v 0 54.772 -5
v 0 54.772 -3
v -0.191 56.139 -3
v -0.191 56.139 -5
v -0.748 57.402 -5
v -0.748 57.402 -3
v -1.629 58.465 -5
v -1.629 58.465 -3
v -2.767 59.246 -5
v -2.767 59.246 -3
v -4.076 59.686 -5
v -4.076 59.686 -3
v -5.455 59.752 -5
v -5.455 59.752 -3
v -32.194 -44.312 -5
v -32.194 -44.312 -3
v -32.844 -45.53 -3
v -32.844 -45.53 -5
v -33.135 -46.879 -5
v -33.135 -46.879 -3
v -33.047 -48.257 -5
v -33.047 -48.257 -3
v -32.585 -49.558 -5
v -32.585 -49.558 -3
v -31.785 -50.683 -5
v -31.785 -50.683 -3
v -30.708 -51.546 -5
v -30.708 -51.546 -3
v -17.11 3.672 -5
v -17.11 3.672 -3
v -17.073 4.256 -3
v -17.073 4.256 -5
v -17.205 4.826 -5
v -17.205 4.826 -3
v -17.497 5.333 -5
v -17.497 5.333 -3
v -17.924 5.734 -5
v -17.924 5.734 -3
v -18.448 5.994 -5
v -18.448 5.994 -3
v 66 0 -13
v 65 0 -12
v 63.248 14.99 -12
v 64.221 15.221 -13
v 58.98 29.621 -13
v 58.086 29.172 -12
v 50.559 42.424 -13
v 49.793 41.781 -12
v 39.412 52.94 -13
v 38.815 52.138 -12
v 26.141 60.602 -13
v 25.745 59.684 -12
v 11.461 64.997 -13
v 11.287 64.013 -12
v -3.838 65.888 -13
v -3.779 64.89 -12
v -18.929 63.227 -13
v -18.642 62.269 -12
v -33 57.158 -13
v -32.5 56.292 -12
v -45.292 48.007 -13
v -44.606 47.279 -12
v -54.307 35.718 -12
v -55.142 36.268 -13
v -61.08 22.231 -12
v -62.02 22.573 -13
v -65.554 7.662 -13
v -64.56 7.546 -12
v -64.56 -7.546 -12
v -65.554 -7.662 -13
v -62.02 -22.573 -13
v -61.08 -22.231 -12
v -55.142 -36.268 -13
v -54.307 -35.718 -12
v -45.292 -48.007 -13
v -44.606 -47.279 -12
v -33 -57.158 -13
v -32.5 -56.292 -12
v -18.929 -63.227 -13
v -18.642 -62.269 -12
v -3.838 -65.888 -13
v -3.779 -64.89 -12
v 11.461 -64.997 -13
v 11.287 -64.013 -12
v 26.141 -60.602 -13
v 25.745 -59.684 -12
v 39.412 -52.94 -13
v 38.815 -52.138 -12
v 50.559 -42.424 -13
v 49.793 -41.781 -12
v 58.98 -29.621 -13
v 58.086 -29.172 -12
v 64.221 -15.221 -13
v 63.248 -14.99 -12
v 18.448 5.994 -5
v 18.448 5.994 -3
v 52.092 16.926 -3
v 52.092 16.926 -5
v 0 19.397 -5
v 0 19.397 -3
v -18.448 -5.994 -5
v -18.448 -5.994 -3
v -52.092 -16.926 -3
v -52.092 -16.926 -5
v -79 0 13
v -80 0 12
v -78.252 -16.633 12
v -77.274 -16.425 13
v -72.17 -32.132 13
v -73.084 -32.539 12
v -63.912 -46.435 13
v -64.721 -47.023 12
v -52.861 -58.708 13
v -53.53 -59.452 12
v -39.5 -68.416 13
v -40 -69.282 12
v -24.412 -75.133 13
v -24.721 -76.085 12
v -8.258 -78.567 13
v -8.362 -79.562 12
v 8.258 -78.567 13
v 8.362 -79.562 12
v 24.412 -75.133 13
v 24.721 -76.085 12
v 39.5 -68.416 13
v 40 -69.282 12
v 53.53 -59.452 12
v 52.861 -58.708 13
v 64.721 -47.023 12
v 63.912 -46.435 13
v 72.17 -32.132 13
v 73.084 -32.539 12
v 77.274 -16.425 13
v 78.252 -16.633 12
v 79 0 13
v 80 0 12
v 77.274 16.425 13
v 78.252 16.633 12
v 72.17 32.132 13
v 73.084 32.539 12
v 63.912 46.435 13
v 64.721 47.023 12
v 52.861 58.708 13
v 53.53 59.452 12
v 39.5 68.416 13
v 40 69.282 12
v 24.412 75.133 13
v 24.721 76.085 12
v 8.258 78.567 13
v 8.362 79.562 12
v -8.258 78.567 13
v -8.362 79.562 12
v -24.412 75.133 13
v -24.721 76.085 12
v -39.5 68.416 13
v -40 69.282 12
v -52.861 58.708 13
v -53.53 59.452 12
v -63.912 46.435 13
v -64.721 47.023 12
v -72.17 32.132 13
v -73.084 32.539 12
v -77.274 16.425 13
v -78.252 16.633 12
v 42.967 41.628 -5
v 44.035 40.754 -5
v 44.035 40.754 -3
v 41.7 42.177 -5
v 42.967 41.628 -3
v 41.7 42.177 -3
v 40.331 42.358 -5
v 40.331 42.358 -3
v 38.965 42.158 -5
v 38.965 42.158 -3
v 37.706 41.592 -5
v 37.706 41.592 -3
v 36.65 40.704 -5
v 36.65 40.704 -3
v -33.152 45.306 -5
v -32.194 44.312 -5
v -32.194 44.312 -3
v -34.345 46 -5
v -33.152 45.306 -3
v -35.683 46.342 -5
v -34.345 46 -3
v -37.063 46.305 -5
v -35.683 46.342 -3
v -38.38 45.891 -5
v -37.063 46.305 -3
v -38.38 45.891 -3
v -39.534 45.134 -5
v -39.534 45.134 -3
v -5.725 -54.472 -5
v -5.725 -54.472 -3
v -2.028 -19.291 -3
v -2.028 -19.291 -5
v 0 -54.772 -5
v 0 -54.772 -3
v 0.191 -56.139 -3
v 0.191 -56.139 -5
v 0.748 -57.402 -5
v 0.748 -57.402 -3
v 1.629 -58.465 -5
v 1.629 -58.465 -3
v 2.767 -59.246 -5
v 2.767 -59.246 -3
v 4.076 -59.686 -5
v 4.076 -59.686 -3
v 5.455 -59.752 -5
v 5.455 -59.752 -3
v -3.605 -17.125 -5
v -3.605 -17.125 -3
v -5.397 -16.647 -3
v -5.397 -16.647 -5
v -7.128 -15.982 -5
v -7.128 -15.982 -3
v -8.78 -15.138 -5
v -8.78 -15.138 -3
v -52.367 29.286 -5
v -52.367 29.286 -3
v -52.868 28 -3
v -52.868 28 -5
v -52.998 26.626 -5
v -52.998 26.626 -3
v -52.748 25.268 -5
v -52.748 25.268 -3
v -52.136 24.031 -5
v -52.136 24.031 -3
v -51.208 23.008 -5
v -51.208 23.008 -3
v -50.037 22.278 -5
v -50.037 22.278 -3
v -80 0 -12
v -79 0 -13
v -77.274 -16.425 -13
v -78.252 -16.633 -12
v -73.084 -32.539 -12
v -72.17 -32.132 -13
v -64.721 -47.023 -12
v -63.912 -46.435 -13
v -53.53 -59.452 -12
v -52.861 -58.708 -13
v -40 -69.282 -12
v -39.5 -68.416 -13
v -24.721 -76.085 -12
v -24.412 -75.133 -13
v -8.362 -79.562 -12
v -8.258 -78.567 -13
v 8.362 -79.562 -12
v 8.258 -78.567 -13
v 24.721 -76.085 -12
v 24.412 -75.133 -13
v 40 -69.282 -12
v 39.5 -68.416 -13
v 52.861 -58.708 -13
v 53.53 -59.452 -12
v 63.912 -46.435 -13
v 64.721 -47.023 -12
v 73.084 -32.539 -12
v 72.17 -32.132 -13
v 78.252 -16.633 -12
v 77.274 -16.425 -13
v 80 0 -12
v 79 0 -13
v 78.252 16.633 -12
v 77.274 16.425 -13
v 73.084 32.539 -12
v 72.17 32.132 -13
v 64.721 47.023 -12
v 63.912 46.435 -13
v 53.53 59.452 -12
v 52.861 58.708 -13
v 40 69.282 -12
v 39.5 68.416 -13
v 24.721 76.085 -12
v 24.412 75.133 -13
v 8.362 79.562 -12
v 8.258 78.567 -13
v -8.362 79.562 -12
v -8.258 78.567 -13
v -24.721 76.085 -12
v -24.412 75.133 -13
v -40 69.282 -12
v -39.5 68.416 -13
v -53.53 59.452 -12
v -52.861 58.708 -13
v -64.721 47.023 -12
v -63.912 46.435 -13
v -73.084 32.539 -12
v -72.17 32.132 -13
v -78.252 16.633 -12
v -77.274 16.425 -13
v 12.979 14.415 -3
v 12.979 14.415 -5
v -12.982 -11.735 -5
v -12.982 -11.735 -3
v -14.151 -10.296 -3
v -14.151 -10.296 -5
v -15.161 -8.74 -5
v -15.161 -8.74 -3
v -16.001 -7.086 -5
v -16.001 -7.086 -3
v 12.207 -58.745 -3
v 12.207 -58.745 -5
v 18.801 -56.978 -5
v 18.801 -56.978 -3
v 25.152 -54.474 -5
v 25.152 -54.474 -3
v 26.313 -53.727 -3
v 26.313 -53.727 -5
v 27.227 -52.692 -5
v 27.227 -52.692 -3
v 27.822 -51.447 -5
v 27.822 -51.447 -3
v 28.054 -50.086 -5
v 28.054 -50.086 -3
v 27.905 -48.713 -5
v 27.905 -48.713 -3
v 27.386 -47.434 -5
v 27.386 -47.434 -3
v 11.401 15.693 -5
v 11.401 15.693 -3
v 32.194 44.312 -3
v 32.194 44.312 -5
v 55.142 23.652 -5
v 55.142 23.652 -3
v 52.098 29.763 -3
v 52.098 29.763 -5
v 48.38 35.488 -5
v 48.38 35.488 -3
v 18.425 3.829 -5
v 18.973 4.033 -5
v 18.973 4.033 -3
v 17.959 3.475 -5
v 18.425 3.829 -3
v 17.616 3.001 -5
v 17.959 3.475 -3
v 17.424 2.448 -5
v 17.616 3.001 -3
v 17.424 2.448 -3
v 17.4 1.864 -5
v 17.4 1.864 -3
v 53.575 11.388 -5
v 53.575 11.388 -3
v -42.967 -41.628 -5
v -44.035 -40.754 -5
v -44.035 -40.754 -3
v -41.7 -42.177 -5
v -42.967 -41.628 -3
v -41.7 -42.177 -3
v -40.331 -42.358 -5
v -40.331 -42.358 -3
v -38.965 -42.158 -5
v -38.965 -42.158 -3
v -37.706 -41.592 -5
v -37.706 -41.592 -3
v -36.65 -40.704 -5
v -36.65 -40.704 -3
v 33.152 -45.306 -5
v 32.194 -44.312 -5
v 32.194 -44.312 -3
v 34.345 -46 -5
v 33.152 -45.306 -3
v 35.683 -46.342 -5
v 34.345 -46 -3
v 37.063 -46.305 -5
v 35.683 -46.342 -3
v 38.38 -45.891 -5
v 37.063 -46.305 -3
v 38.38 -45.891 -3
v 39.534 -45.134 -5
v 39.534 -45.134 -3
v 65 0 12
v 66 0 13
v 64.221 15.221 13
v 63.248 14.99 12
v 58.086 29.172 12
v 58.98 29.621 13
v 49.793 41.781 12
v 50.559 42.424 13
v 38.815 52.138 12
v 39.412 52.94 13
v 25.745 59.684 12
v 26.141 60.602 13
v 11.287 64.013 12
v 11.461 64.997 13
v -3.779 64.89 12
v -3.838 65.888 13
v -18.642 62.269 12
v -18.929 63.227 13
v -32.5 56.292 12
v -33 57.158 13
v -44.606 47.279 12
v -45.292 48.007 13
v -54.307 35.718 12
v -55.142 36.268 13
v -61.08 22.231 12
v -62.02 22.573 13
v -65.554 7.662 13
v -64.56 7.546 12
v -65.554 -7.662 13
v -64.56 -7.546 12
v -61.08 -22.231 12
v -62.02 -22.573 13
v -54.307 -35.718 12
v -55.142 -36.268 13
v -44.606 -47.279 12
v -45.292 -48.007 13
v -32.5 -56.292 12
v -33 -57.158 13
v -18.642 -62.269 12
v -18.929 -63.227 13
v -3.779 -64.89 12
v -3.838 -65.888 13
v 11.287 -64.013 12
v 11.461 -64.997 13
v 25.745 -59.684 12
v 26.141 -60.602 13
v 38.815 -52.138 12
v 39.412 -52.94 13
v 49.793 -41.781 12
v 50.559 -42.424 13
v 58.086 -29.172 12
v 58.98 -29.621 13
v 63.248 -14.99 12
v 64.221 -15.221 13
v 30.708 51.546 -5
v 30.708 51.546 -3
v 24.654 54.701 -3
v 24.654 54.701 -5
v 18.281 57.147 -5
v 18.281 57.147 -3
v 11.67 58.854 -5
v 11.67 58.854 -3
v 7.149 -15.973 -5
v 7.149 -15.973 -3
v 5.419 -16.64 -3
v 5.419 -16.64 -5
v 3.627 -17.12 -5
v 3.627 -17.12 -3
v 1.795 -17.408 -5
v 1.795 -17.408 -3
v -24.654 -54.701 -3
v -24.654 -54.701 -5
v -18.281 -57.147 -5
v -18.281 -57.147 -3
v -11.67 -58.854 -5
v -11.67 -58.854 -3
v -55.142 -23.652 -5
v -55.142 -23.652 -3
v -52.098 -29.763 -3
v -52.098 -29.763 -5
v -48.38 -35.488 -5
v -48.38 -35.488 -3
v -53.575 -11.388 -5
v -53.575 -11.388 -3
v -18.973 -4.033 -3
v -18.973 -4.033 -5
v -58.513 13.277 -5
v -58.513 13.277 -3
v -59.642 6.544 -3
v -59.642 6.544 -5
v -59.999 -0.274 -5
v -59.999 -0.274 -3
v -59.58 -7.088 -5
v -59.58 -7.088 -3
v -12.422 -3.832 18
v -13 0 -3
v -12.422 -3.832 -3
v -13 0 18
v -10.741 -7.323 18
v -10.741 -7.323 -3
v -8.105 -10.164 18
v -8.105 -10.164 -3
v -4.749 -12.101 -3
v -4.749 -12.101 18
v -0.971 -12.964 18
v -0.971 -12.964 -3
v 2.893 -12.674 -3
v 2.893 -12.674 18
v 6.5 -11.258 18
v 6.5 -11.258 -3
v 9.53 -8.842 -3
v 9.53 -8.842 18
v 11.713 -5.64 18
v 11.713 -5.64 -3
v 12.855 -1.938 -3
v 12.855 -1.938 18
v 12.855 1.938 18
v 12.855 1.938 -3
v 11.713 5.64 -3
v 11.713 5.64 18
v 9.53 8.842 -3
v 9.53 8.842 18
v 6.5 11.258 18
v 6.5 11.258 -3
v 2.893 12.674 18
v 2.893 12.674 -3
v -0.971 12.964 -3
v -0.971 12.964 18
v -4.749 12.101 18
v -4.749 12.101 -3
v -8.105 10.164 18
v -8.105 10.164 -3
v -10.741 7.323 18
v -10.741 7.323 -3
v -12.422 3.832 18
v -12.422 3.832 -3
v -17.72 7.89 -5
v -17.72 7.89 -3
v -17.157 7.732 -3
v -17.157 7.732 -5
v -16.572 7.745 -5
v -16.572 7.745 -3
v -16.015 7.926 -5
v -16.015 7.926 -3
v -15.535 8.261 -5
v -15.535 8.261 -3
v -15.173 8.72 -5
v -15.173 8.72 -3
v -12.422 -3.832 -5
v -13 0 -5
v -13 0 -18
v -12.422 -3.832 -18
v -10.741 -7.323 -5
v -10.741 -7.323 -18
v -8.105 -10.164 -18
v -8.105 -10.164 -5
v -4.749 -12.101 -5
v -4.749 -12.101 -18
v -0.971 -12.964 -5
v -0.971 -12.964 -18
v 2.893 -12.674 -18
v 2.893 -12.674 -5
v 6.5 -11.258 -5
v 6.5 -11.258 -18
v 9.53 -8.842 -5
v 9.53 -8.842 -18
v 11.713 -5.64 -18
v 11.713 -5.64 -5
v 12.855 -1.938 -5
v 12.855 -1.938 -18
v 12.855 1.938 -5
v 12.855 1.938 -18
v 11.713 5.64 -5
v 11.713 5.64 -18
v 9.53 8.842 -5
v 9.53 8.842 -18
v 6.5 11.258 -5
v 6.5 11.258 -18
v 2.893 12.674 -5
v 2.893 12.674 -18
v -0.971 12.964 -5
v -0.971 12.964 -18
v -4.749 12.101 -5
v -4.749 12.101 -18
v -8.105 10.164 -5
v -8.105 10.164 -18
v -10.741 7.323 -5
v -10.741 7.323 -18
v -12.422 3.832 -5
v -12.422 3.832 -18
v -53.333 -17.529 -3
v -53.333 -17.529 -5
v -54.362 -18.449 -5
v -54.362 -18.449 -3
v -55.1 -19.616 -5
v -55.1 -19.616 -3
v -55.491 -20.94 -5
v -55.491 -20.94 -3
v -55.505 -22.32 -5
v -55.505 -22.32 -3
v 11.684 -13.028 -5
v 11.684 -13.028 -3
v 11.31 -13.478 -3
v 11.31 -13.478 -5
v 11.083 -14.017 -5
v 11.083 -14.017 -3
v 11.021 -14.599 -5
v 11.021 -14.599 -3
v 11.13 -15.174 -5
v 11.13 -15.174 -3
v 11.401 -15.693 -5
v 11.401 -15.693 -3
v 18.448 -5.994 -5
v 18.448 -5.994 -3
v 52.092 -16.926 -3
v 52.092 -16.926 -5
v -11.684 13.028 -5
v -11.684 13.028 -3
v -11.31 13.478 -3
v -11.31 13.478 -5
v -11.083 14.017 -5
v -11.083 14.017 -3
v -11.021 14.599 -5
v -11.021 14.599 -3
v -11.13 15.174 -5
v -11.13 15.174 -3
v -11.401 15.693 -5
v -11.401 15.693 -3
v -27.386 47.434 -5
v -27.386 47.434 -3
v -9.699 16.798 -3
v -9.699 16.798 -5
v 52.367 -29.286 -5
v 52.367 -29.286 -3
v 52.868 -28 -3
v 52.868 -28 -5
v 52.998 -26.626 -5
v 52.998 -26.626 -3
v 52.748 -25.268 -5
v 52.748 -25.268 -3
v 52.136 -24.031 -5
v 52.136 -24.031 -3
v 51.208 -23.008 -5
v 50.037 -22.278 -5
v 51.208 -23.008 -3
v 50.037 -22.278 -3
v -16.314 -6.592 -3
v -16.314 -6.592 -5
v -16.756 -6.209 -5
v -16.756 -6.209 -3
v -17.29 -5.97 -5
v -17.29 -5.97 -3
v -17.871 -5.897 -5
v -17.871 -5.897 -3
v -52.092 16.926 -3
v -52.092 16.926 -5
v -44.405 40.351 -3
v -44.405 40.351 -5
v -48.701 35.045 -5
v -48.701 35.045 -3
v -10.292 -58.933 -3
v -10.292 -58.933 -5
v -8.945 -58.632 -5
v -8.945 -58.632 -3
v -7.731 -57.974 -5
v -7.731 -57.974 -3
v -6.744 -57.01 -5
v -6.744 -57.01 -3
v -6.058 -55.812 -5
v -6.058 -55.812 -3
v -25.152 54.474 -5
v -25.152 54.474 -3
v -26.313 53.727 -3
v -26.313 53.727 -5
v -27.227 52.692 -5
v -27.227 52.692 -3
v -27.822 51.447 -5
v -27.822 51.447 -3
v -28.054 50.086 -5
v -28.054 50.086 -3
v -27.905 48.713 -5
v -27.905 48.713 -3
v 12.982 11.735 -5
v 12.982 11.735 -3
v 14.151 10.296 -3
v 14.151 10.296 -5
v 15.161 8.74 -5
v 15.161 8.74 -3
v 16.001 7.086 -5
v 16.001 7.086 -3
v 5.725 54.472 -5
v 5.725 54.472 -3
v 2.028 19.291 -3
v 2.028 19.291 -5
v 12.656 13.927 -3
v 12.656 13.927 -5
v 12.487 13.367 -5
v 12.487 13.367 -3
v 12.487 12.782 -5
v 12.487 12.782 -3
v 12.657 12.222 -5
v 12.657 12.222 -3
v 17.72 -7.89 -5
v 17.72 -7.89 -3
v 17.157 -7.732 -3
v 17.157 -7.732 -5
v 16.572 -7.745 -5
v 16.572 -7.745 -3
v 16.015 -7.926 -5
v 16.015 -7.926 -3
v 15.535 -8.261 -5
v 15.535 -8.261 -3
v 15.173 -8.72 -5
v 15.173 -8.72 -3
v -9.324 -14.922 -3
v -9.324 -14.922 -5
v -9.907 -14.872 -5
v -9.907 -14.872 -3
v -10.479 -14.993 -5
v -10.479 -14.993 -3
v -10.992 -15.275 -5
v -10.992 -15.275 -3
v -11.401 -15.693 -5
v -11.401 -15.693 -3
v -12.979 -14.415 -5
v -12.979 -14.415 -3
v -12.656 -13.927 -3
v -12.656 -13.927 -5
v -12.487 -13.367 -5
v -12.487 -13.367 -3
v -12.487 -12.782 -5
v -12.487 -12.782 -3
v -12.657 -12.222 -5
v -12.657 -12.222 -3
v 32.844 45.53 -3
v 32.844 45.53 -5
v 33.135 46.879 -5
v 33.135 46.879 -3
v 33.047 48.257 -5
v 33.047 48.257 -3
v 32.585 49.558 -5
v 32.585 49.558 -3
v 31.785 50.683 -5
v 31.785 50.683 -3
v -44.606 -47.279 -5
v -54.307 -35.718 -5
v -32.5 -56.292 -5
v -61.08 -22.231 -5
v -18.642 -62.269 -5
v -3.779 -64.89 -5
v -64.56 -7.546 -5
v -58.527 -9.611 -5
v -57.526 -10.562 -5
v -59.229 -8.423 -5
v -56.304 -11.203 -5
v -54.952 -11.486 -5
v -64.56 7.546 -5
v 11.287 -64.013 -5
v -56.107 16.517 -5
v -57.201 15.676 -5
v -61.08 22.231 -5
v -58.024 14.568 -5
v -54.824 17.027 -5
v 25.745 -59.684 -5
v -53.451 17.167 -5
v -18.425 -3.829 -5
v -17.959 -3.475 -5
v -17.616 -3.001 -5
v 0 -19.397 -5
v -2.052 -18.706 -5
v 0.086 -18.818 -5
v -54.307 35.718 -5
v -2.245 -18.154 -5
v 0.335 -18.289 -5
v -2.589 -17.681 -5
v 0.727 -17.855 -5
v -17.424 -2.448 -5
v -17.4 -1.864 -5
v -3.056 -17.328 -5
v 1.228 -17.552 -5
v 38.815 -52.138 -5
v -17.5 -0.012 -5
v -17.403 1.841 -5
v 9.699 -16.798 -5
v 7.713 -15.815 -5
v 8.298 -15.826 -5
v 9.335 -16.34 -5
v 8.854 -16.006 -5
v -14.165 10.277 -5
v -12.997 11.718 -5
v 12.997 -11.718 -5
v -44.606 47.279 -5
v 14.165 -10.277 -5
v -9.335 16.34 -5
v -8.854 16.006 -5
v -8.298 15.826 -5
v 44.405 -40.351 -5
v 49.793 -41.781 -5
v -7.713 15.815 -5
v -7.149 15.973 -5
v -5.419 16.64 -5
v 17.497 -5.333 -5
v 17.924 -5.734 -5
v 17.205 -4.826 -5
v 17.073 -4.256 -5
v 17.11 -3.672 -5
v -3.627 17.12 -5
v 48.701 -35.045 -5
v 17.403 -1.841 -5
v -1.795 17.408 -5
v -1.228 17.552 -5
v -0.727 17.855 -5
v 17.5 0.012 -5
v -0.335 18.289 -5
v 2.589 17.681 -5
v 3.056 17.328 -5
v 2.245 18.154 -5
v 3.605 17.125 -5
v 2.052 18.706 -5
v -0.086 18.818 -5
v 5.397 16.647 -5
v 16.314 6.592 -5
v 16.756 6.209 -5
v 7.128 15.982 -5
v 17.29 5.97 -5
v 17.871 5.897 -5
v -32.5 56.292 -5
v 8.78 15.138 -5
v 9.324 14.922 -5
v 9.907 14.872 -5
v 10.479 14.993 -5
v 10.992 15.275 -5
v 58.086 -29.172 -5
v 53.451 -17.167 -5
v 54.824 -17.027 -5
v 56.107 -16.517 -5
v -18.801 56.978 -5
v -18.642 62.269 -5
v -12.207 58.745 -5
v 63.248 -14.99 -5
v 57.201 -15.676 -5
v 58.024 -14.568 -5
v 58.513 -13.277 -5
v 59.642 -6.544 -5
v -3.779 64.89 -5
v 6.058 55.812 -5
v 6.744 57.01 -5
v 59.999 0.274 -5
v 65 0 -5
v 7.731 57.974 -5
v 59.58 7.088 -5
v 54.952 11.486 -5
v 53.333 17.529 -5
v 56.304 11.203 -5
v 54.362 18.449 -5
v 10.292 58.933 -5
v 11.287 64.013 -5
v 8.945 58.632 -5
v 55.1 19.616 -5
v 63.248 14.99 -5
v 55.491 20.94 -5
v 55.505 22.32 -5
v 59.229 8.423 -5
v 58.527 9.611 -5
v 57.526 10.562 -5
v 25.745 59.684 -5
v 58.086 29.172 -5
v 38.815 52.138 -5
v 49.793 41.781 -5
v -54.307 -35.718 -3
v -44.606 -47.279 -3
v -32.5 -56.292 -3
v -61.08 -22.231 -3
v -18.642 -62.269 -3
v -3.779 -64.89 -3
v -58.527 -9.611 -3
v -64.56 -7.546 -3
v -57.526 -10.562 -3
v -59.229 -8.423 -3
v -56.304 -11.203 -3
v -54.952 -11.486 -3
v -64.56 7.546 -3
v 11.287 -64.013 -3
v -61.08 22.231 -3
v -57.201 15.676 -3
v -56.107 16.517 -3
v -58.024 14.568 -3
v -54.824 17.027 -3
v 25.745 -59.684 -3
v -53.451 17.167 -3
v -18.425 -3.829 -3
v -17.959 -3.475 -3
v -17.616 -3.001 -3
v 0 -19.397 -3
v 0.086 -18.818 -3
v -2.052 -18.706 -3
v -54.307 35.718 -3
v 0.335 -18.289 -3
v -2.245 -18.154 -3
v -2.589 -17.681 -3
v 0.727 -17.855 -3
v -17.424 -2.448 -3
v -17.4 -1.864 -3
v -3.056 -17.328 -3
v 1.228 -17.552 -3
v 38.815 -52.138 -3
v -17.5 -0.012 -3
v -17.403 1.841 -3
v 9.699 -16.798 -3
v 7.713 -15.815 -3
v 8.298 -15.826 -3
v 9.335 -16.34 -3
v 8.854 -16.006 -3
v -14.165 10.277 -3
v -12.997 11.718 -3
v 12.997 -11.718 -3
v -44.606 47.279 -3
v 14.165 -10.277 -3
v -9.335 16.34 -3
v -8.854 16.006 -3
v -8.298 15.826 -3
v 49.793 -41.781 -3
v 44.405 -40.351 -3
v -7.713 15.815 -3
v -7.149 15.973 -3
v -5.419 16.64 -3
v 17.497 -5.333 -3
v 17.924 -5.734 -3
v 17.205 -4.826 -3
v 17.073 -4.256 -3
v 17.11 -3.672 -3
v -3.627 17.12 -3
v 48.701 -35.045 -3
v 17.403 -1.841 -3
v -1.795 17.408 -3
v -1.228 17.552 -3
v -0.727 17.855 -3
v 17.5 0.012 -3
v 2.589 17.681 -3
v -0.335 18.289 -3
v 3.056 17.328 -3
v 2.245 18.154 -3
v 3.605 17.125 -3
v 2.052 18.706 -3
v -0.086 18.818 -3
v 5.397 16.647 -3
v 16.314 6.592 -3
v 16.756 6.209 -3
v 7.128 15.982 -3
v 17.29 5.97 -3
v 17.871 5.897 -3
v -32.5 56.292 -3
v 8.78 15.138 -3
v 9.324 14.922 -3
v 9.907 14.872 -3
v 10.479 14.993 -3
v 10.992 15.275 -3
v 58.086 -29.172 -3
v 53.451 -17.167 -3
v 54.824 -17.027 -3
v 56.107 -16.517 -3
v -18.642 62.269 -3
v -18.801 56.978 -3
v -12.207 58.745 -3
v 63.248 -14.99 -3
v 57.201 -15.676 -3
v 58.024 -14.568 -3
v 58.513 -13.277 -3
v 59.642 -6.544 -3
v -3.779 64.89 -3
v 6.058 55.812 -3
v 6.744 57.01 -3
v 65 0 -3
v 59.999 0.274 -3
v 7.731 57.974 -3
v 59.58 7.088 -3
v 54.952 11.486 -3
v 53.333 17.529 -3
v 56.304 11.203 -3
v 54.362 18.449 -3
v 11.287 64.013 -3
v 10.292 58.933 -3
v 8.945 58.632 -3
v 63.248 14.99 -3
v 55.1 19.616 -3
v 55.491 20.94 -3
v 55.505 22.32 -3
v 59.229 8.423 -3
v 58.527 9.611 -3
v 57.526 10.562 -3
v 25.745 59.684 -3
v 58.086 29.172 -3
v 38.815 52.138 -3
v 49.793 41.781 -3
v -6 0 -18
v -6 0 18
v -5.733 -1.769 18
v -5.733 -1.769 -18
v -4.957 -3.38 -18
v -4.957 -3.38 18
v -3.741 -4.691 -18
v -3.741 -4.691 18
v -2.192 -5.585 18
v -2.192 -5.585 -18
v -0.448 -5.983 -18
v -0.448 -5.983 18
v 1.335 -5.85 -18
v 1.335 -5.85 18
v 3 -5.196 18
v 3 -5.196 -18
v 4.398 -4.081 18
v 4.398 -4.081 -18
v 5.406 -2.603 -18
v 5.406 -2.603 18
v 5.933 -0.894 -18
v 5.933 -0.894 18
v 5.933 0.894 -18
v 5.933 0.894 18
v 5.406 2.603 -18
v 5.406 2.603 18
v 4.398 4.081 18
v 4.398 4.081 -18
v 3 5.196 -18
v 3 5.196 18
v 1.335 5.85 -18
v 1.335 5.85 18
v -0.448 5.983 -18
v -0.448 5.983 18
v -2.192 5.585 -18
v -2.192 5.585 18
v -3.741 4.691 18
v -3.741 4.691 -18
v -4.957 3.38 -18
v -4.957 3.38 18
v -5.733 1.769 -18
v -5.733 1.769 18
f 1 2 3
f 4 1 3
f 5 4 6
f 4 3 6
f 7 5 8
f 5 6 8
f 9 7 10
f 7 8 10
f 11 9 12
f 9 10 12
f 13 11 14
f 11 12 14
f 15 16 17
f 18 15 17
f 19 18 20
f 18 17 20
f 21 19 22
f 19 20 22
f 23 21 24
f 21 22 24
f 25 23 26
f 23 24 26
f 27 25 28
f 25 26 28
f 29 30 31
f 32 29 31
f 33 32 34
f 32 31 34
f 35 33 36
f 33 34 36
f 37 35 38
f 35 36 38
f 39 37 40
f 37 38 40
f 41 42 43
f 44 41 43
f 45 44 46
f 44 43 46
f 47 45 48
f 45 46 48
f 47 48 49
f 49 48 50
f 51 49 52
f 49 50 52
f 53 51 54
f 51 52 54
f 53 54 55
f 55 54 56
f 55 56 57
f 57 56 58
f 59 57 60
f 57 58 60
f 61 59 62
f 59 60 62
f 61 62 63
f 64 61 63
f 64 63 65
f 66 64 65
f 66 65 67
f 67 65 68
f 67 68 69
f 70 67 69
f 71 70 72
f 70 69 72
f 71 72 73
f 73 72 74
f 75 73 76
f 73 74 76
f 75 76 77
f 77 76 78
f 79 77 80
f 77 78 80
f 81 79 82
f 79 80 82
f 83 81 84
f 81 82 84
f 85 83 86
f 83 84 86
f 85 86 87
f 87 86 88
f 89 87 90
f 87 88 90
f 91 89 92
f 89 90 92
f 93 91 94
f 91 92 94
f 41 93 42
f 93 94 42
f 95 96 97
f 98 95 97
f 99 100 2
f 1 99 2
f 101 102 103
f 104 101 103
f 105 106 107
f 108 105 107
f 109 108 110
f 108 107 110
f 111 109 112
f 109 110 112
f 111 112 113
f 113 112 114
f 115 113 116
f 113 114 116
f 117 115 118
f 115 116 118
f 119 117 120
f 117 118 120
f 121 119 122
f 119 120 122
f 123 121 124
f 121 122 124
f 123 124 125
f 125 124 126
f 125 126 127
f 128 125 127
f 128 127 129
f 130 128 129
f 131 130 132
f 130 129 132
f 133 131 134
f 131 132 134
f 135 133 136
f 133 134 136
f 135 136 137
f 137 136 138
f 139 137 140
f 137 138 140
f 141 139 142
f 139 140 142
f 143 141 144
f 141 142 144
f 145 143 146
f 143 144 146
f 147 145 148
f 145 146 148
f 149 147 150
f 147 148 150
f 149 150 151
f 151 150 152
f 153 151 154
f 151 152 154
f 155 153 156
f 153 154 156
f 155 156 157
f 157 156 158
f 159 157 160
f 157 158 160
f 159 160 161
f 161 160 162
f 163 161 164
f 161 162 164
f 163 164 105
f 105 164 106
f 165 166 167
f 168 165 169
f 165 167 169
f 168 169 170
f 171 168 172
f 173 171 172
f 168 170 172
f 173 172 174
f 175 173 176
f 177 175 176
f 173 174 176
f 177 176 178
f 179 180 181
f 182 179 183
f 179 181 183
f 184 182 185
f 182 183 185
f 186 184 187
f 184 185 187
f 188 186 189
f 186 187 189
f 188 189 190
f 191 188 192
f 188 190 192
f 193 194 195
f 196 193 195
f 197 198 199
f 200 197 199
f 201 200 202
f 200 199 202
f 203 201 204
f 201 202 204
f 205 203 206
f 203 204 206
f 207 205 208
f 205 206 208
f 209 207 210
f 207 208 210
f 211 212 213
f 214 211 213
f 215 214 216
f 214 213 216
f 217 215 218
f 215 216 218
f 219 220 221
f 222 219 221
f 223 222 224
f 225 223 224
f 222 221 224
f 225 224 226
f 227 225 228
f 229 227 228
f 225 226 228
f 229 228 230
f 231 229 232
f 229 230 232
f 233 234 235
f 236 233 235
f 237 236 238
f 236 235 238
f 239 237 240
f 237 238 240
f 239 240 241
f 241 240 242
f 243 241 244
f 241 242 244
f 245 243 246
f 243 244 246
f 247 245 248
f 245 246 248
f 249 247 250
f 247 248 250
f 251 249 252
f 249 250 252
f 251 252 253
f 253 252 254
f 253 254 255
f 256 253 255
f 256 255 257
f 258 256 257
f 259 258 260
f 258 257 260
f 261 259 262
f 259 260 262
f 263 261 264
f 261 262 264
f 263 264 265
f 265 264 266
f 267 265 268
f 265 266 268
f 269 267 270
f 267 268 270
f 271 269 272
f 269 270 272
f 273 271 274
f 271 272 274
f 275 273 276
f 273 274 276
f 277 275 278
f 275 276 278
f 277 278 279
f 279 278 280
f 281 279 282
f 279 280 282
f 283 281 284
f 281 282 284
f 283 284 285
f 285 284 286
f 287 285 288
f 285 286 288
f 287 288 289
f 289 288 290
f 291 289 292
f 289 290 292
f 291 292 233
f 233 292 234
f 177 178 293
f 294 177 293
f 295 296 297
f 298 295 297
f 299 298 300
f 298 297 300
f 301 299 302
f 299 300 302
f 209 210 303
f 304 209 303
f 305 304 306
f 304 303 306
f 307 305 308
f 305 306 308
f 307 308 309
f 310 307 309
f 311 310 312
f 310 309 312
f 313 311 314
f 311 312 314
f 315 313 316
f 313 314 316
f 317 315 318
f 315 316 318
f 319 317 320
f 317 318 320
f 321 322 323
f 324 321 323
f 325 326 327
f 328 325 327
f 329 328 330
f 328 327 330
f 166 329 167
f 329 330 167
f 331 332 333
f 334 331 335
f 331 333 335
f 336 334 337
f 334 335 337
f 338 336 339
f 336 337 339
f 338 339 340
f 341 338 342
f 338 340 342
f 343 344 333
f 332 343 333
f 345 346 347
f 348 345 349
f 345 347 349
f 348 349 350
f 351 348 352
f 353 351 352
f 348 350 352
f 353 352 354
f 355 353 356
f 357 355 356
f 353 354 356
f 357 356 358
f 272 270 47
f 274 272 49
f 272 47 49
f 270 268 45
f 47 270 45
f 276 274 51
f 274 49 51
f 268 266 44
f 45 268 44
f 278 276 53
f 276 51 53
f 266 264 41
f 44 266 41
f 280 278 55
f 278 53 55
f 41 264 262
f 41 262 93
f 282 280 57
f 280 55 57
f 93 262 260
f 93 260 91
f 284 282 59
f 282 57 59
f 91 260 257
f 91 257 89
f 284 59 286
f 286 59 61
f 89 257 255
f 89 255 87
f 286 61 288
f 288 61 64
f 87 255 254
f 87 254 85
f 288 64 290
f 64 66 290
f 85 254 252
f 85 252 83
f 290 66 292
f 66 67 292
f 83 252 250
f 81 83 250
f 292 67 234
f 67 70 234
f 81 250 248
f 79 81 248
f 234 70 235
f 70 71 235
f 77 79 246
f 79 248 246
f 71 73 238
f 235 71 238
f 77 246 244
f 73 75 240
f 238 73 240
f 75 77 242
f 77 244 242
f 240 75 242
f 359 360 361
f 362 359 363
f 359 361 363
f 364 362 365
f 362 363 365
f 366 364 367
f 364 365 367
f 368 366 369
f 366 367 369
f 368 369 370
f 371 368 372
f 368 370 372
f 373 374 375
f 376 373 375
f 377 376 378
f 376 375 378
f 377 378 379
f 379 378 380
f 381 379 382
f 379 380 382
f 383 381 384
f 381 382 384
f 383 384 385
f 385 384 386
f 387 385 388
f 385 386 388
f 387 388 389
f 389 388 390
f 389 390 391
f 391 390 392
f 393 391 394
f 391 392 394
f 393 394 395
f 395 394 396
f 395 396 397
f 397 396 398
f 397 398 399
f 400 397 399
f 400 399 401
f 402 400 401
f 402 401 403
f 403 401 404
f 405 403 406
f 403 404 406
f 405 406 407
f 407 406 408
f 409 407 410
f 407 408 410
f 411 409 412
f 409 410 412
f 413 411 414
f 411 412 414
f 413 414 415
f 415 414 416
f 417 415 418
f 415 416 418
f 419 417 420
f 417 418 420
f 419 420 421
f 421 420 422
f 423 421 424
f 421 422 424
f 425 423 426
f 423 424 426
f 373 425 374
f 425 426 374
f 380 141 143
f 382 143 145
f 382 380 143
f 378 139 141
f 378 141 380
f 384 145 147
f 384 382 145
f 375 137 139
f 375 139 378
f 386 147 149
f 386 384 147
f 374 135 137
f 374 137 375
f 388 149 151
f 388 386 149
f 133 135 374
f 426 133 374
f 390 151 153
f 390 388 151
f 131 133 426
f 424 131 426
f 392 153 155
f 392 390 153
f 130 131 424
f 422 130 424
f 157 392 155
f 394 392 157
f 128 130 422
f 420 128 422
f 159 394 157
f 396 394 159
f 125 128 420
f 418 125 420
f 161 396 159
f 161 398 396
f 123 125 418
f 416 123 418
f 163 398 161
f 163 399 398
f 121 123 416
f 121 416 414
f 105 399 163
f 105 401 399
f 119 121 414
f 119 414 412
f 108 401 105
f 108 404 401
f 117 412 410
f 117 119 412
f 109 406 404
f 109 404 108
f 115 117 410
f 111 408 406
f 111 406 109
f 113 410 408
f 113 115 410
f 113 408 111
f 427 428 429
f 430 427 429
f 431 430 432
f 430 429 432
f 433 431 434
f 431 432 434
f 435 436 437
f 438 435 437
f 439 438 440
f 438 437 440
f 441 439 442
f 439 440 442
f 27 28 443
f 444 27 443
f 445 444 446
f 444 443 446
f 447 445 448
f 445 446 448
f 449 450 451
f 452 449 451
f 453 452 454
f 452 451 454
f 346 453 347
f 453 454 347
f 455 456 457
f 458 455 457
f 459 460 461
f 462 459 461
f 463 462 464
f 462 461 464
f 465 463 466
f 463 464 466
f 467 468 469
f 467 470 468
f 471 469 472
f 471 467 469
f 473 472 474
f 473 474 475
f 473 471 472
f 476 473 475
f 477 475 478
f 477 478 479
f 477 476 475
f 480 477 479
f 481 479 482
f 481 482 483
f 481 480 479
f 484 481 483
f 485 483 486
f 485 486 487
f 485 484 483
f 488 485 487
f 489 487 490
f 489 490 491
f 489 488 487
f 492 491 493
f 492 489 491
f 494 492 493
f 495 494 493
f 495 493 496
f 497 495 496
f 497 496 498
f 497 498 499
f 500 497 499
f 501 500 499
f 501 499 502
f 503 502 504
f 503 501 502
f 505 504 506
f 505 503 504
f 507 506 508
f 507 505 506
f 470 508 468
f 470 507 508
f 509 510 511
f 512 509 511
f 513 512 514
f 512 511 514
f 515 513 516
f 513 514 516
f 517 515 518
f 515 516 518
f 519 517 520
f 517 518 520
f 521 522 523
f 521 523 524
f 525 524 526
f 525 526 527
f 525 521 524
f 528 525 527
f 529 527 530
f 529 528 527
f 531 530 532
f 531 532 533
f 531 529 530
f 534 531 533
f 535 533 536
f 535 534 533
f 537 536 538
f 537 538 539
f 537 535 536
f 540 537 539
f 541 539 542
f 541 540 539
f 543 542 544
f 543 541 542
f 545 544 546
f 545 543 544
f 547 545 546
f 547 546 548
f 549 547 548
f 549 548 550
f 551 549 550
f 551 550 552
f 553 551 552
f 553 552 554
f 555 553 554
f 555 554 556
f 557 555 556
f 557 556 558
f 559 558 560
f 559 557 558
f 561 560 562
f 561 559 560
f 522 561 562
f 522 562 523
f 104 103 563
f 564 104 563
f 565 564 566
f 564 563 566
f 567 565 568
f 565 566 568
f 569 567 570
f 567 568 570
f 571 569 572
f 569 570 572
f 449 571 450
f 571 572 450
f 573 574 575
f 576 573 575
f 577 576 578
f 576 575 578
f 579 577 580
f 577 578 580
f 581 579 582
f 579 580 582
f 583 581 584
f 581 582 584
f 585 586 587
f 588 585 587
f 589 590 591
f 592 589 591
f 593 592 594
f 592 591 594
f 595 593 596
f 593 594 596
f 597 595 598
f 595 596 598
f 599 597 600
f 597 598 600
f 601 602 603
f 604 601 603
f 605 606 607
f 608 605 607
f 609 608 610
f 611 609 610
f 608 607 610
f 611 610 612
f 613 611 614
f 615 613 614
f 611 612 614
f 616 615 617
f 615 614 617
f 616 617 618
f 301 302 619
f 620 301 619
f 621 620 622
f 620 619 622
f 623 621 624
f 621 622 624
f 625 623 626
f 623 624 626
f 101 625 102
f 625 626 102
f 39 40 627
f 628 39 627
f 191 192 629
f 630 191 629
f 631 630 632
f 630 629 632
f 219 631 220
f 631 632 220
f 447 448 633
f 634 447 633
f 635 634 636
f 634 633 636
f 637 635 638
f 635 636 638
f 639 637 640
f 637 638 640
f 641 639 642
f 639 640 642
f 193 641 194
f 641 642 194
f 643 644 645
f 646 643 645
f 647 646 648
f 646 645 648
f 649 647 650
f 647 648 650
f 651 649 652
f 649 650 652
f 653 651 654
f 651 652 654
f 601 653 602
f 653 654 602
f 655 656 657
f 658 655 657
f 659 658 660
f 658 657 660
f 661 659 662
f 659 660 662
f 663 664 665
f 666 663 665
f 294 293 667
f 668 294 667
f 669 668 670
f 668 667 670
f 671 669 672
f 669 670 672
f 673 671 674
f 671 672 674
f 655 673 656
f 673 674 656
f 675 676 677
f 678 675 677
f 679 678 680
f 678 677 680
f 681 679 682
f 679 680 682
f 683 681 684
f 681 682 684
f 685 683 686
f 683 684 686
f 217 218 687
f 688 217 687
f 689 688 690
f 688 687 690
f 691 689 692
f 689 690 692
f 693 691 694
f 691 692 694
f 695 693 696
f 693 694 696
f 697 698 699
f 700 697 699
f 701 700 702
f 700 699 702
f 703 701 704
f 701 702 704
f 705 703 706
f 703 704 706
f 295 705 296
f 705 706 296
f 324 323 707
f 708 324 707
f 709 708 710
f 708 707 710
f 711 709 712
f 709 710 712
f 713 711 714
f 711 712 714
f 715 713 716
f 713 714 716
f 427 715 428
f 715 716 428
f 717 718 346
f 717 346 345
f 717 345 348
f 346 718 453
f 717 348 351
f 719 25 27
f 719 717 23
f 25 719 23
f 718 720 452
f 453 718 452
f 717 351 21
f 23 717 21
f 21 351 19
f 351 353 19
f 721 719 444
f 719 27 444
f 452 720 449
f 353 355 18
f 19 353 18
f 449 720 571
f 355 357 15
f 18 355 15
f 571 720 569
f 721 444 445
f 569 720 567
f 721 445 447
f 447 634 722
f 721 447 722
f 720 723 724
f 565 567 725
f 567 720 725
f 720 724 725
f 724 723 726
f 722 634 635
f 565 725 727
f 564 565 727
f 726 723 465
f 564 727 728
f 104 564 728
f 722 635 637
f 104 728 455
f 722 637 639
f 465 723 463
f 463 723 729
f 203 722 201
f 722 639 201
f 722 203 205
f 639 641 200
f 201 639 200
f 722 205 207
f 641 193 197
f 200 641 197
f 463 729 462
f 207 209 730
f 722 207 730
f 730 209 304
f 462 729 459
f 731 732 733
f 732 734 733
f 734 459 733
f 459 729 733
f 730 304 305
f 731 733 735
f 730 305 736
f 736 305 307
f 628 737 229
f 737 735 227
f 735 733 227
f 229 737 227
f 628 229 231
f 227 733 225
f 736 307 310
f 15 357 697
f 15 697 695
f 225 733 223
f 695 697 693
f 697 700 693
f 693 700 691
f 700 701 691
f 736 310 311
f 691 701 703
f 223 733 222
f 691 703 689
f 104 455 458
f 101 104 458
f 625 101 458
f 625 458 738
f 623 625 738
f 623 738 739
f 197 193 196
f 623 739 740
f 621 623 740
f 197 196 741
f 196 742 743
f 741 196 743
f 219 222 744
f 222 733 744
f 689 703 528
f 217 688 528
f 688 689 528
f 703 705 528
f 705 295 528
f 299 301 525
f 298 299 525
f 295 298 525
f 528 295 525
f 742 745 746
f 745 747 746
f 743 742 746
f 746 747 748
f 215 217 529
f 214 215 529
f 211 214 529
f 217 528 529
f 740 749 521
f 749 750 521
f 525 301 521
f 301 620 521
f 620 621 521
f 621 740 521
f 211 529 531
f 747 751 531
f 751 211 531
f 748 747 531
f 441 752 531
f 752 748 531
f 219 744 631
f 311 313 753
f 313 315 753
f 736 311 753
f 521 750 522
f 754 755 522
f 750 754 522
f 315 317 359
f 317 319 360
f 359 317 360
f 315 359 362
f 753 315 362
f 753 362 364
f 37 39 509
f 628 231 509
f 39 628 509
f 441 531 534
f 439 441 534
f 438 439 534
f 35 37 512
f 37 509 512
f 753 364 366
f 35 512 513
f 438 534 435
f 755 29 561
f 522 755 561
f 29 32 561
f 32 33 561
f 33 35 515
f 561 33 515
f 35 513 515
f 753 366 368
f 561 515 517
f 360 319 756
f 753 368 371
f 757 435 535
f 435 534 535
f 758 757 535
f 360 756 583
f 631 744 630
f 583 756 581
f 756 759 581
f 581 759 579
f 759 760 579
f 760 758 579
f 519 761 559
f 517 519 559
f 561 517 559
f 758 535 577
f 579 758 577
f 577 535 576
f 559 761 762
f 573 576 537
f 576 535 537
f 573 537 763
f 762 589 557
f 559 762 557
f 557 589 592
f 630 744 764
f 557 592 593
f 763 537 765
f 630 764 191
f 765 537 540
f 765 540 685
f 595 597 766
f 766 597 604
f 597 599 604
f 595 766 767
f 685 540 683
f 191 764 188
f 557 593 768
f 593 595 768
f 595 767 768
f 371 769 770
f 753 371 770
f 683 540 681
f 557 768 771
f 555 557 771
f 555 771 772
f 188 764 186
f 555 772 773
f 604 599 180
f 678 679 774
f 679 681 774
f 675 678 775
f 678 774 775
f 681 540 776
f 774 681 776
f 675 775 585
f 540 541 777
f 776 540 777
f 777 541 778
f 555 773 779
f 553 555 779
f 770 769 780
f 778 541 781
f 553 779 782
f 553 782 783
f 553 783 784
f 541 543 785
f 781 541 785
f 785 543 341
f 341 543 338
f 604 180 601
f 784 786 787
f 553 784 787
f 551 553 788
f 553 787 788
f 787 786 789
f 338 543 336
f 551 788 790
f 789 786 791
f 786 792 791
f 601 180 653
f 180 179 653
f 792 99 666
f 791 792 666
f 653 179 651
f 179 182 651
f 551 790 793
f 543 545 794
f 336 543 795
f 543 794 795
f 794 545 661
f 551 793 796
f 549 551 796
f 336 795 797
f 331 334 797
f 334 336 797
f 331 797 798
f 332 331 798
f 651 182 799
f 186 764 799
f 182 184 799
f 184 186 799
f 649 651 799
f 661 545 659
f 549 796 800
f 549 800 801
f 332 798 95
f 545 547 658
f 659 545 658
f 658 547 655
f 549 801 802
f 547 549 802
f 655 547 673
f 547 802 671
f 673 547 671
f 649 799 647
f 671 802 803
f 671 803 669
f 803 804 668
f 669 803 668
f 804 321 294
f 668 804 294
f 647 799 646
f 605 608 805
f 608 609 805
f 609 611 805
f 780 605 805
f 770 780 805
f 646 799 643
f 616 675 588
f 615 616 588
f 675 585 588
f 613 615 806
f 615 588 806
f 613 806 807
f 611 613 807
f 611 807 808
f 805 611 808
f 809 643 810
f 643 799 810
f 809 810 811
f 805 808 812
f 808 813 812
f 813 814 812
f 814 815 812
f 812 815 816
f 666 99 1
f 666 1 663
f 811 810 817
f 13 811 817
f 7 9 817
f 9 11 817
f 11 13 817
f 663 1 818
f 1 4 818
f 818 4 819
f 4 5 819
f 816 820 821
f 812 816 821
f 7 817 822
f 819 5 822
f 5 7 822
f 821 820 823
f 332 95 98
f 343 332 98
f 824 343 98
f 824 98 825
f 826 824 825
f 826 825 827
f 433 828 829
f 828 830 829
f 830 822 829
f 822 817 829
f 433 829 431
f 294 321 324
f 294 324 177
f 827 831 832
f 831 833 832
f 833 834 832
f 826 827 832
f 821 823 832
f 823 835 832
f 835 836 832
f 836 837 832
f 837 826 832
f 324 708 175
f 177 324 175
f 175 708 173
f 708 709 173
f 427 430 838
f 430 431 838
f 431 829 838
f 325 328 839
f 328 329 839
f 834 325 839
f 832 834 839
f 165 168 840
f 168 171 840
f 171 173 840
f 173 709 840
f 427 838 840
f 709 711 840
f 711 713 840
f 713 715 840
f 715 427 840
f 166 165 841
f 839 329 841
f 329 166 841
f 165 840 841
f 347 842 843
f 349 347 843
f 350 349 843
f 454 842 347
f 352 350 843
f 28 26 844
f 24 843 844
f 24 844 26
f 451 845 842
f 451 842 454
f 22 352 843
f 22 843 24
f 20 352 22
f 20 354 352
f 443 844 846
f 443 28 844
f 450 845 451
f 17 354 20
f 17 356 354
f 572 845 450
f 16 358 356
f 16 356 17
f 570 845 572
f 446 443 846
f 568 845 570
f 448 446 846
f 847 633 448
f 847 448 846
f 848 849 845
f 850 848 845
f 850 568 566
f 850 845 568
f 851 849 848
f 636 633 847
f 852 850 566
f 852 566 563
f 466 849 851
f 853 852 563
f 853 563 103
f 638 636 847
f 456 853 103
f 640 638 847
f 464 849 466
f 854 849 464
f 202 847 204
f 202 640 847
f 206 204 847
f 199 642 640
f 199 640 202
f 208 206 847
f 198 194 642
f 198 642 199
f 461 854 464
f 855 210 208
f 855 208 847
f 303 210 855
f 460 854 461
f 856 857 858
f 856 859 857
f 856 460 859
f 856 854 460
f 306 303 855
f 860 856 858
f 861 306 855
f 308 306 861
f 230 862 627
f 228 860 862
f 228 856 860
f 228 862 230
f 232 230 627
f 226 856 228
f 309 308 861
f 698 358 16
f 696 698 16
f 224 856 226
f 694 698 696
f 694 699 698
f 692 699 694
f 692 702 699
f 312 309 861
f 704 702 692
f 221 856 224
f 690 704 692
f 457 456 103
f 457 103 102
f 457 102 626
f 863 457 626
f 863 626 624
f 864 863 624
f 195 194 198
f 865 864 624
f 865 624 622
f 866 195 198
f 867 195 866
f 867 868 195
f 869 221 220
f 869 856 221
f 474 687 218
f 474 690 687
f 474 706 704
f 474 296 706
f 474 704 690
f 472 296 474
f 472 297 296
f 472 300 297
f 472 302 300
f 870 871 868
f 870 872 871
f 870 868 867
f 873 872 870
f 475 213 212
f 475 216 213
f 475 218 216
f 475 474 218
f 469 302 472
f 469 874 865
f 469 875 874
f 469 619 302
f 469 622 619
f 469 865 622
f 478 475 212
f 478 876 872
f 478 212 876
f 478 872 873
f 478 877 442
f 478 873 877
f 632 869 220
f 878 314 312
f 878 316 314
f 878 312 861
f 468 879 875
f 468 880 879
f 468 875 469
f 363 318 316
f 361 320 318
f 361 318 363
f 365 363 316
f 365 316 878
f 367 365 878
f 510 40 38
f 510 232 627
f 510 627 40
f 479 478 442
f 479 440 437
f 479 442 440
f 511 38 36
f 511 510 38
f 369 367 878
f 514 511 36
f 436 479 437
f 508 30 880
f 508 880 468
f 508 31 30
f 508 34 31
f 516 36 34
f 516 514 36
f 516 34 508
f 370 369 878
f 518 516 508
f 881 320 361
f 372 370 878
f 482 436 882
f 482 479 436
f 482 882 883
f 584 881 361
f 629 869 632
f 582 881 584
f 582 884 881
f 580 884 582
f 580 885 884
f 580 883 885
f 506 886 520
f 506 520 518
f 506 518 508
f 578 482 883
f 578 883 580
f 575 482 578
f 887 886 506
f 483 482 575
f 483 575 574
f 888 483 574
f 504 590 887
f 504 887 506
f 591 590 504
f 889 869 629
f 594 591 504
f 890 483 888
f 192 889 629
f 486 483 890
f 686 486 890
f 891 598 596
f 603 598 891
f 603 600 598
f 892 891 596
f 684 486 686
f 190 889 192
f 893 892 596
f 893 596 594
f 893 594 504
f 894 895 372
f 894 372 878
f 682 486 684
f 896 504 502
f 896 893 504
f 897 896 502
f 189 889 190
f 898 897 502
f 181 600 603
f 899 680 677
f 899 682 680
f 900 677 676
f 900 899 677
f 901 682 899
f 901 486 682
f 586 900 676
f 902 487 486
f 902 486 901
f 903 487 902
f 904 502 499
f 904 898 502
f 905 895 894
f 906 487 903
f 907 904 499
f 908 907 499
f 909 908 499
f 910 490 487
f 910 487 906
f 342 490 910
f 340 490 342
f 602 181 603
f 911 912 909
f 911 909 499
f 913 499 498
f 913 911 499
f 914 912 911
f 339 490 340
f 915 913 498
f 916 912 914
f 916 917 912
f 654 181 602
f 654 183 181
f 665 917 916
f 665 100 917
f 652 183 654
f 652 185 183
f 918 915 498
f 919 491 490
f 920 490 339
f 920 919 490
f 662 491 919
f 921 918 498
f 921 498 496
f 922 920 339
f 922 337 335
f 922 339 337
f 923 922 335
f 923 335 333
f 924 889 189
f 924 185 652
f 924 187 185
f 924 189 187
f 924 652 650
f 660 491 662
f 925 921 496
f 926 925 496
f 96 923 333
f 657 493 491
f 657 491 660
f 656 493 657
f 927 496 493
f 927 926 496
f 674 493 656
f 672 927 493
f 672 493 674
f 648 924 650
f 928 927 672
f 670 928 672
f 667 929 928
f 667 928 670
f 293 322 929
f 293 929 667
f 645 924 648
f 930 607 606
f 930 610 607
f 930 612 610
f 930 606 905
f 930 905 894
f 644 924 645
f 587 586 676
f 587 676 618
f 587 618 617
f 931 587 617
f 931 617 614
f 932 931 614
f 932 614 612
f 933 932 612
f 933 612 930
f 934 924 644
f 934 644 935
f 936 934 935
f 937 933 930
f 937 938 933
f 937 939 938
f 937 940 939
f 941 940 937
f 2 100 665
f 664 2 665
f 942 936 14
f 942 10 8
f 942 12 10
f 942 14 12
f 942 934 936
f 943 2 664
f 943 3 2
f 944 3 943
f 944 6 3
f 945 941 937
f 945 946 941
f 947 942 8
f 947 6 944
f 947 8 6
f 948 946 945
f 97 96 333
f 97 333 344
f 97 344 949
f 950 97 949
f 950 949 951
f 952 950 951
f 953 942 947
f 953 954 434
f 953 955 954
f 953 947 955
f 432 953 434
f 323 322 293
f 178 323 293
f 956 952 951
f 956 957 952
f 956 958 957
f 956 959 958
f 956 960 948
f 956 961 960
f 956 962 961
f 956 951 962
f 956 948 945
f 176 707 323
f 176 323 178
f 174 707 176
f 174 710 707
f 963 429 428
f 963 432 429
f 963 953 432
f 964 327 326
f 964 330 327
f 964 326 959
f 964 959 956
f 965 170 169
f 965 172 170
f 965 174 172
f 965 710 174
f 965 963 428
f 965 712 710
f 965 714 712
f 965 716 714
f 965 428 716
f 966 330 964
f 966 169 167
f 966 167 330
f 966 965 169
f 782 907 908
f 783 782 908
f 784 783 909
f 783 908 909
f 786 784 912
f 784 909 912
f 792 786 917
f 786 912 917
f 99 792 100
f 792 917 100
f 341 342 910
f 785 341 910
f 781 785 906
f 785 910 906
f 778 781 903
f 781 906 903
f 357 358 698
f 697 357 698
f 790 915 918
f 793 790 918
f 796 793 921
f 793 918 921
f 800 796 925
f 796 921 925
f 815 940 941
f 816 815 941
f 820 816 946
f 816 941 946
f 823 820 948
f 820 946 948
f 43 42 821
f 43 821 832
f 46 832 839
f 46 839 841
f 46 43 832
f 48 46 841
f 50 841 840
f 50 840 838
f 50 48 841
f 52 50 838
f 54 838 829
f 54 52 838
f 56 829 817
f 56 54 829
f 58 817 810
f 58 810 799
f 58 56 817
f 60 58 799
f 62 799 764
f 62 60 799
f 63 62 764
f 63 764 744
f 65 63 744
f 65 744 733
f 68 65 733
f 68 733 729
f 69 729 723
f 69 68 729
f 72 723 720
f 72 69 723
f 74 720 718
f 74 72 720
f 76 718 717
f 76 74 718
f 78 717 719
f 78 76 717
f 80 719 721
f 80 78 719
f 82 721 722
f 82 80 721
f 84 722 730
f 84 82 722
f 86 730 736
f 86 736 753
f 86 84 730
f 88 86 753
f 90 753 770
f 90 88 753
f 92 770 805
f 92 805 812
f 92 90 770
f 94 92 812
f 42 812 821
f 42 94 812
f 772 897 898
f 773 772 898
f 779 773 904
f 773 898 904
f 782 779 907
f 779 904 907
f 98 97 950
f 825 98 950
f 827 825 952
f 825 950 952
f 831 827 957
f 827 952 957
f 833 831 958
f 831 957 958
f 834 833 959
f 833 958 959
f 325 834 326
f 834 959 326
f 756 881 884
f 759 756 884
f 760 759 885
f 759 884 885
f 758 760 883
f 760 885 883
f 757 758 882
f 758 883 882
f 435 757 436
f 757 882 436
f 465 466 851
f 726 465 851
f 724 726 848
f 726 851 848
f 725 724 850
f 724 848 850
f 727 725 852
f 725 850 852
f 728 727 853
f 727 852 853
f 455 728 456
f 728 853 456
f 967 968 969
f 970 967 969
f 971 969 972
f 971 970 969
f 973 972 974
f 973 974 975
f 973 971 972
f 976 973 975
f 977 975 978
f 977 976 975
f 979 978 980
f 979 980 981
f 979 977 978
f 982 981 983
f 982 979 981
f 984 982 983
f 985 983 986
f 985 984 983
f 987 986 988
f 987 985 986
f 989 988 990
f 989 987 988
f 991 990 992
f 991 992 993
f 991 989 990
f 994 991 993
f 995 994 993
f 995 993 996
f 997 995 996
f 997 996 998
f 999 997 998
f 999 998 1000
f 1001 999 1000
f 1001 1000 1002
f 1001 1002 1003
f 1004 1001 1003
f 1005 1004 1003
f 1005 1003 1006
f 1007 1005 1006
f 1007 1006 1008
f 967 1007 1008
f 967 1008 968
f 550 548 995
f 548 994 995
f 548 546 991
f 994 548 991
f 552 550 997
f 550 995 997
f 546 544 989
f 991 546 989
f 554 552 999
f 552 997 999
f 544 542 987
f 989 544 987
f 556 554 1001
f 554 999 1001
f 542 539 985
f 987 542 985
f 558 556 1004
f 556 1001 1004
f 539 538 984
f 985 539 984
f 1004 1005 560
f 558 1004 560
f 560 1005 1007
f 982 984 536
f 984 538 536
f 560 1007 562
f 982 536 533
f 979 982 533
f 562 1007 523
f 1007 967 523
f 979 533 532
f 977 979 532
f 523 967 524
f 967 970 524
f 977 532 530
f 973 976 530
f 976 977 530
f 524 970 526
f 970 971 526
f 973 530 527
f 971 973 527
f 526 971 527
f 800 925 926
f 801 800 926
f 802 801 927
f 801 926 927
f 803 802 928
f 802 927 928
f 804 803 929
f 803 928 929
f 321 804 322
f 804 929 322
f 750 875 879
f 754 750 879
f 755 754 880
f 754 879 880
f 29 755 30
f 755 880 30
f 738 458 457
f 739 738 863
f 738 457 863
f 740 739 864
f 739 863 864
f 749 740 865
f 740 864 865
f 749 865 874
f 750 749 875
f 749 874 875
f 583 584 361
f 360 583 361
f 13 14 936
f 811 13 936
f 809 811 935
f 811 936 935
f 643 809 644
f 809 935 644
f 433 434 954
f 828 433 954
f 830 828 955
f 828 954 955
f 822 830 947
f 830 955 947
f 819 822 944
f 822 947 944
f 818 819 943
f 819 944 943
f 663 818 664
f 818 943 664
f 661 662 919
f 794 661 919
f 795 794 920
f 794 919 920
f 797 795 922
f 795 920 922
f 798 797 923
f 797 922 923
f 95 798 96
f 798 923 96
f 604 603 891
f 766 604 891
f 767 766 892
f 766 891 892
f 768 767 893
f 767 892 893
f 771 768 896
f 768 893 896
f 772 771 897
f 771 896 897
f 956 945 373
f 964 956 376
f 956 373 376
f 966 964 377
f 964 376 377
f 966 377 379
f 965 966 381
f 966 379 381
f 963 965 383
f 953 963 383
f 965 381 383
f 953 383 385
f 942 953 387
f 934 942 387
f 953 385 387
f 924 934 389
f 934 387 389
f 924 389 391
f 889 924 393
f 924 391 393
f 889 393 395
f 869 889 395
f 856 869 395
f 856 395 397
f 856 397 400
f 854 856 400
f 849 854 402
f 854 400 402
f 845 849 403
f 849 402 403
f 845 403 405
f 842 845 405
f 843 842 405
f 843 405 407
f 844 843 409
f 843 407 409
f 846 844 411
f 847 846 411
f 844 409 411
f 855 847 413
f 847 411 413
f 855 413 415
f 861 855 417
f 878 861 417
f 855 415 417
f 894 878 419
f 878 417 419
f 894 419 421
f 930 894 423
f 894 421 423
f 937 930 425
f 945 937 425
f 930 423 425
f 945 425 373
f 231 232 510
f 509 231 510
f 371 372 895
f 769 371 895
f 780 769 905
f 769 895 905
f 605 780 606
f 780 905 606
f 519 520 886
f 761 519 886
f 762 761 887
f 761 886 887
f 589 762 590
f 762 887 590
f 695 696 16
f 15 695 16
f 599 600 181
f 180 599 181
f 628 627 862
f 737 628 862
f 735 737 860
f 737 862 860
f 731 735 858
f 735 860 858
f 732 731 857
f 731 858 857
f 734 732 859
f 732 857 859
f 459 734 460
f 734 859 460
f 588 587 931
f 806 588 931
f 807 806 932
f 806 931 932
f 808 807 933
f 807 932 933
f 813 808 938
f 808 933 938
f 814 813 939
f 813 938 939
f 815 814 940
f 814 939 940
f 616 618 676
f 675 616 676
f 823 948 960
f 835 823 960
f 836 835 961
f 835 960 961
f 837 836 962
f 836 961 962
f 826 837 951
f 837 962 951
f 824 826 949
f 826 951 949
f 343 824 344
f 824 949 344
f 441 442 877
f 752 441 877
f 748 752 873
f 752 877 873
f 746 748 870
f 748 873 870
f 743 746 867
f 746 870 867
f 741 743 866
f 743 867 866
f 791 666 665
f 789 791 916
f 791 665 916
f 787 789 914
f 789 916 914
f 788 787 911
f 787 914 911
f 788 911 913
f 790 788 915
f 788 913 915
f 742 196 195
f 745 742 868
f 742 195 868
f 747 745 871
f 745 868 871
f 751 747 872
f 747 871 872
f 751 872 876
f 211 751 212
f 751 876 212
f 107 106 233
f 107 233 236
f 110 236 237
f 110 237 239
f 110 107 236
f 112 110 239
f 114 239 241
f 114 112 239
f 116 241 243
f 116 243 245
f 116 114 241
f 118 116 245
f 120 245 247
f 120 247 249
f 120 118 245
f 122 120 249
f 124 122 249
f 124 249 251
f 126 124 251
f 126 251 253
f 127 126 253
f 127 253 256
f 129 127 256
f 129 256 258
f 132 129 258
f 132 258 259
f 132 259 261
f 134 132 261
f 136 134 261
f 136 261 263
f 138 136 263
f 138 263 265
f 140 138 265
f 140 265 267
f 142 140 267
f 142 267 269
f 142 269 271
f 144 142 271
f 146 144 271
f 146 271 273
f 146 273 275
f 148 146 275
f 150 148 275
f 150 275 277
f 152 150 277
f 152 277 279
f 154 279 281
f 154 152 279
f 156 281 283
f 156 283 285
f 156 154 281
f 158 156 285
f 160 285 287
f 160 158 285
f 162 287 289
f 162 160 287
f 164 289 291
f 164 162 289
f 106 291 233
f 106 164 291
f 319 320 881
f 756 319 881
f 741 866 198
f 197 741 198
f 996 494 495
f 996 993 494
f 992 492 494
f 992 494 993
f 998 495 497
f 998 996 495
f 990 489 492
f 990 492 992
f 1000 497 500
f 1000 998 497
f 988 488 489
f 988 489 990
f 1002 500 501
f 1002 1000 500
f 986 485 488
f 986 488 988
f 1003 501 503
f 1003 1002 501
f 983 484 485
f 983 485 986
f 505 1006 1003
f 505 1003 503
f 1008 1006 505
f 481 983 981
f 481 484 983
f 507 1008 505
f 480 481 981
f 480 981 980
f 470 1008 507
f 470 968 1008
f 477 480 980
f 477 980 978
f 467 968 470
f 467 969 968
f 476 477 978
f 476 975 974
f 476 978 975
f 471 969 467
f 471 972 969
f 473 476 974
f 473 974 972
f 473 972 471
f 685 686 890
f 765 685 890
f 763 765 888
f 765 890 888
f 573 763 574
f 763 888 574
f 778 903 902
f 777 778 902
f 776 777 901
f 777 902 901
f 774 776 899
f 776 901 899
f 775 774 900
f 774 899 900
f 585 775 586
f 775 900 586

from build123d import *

# Parameters (mm, degrees)
SKETCH1_R             = 80
SKETCH1_R_2           = 6
BOSS_EXTRUDE1_DEPTH   = 13
SKETCH2_R             = 65
CUT_EXTRUDE1_DEPTH    = 8
MIRROR1_START         = -13
MIRROR1_OUTLINE_R     = 65
MIRROR1_OUTLINE_R_2   = 6
MIRROR1_DEPTH         = 8
MIRROR1_START_2       = -3
MIRROR1_2_OUTLINE_R   = 65
MIRROR1_2_OUTLINE_R_2 = 6
MIRROR1_2_DEPTH       = 8
SKETCH3_R             = 13
SKETCH3_R_2           = 6
BOSS_EXTRUDE2_DEPTH   = 18
CHAMFER1_SIZE         = 1
CUT_EXTRUDE2_DEPTH    = 116.06954419
CIRPATTERN1_COUNT     = 10


# Read off the part's stored shape, not the designer's step: Mirror1
with BuildPart() as part:
    # Sketch1 → Boss-Extrude1 (new, symmetric)
    with BuildSketch(Plane.XY):
        with Locations(Location((0, 0, 0), (0, 0, 180))):
            Circle(SKETCH1_R)
        with Locations(Location((0, 0, 0), (0, 0, 180))):
            Circle(SKETCH1_R_2, mode=Mode.SUBTRACT)
    extrude(amount=BOSS_EXTRUDE1_DEPTH, both=True)

    # Sketch2 → Cut-Extrude1 (cut)
    with BuildSketch(Plane.XY.offset(13)):
        Circle(SKETCH2_R)
    extrude(amount=-CUT_EXTRUDE1_DEPTH, mode=Mode.SUBTRACT)

    # Mirror1 outline → Mirror1 (cut)
    with BuildSketch(Plane.XY.offset(MIRROR1_START)):
        Circle(MIRROR1_OUTLINE_R)
        Circle(MIRROR1_OUTLINE_R_2, mode=Mode.SUBTRACT)
    extrude(amount=MIRROR1_DEPTH, mode=Mode.SUBTRACT)

    # Mirror1 2 outline → Mirror1 2 (cut)
    with BuildSketch(Plane.XY.offset(MIRROR1_START_2)):
        Circle(MIRROR1_2_OUTLINE_R)
        Circle(MIRROR1_2_OUTLINE_R_2, mode=Mode.SUBTRACT)
    extrude(amount=MIRROR1_2_DEPTH, mode=Mode.SUBTRACT)

    # Sketch3 → Boss-Extrude2 (add, symmetric)
    with BuildSketch(Plane.XY):
        with Locations(Location((0, 0, 0), (0, 0, 180))):
            Circle(SKETCH3_R)
        with Locations(Location((0, 0, 0), (0, 0, 180))):
            Circle(SKETCH3_R_2, mode=Mode.SUBTRACT)
    extrude(amount=BOSS_EXTRUDE2_DEPTH, both=True)

    # Chamfer1
    chamfer1_edges = [part.edges().sort_by_distance(p)[0] for p in [
        (-65, 0, 13),
        (-65, 0, -13),
        (80, 0, -13),
        (80, 0, 13),
    ]]
    chamfer(chamfer1_edges, length=CHAMFER1_SIZE)

    # Sketch4 → Cut-Extrude2 (cut, through all)
    with BuildSketch(Plane.XY.offset(-3)):
        with BuildLine():
            Line((0, 19.397164741), (0, 54.772255751))
            ThreePointArc((0, 54.772255751), (-1.629000688, 58.46500048), (-5.454545455, 59.751551728))
            ThreePointArc((-5.454545455, 59.751551728), (-15.529142706, 57.955549577), (-25.152000934, 54.473634439))
            ThreePointArc((-25.152000934, 54.473634439), (-27.821744262, 51.446675992), (-27.386127875, 47.434164903))
            Line((-27.386127875, 47.434164903), (-9.698582371, 16.798437427))
            ThreePointArc((-9.698582371, 16.798437427), (-8.582686936, 15.895715021), (-7.149451403, 15.972956666))
            ThreePointArc((-7.149451403, 15.972956666), (-4.529333289, 16.90370196), (-1.794871795, 17.407711947))
            ThreePointArc((-1.794871795, 17.407711947), (-0.515032591, 18.057436487), (0, 19.397164741))
        make_face()
    cut_extrude2 = extrude(amount=-CUT_EXTRUDE2_DEPTH, mode=Mode.SUBTRACT)

    # CirPattern1: Cut-Extrude2 ×10 about axis
    cirpattern1_axis = Axis((0, 0, 0), (0, 0, 1))
    for i in range(1, CIRPATTERN1_COUNT):
        add(cut_extrude2.rotate(cirpattern1_axis, i * 360 / CIRPATTERN1_COUNT), mode=Mode.SUBTRACT)


solid = part.part
